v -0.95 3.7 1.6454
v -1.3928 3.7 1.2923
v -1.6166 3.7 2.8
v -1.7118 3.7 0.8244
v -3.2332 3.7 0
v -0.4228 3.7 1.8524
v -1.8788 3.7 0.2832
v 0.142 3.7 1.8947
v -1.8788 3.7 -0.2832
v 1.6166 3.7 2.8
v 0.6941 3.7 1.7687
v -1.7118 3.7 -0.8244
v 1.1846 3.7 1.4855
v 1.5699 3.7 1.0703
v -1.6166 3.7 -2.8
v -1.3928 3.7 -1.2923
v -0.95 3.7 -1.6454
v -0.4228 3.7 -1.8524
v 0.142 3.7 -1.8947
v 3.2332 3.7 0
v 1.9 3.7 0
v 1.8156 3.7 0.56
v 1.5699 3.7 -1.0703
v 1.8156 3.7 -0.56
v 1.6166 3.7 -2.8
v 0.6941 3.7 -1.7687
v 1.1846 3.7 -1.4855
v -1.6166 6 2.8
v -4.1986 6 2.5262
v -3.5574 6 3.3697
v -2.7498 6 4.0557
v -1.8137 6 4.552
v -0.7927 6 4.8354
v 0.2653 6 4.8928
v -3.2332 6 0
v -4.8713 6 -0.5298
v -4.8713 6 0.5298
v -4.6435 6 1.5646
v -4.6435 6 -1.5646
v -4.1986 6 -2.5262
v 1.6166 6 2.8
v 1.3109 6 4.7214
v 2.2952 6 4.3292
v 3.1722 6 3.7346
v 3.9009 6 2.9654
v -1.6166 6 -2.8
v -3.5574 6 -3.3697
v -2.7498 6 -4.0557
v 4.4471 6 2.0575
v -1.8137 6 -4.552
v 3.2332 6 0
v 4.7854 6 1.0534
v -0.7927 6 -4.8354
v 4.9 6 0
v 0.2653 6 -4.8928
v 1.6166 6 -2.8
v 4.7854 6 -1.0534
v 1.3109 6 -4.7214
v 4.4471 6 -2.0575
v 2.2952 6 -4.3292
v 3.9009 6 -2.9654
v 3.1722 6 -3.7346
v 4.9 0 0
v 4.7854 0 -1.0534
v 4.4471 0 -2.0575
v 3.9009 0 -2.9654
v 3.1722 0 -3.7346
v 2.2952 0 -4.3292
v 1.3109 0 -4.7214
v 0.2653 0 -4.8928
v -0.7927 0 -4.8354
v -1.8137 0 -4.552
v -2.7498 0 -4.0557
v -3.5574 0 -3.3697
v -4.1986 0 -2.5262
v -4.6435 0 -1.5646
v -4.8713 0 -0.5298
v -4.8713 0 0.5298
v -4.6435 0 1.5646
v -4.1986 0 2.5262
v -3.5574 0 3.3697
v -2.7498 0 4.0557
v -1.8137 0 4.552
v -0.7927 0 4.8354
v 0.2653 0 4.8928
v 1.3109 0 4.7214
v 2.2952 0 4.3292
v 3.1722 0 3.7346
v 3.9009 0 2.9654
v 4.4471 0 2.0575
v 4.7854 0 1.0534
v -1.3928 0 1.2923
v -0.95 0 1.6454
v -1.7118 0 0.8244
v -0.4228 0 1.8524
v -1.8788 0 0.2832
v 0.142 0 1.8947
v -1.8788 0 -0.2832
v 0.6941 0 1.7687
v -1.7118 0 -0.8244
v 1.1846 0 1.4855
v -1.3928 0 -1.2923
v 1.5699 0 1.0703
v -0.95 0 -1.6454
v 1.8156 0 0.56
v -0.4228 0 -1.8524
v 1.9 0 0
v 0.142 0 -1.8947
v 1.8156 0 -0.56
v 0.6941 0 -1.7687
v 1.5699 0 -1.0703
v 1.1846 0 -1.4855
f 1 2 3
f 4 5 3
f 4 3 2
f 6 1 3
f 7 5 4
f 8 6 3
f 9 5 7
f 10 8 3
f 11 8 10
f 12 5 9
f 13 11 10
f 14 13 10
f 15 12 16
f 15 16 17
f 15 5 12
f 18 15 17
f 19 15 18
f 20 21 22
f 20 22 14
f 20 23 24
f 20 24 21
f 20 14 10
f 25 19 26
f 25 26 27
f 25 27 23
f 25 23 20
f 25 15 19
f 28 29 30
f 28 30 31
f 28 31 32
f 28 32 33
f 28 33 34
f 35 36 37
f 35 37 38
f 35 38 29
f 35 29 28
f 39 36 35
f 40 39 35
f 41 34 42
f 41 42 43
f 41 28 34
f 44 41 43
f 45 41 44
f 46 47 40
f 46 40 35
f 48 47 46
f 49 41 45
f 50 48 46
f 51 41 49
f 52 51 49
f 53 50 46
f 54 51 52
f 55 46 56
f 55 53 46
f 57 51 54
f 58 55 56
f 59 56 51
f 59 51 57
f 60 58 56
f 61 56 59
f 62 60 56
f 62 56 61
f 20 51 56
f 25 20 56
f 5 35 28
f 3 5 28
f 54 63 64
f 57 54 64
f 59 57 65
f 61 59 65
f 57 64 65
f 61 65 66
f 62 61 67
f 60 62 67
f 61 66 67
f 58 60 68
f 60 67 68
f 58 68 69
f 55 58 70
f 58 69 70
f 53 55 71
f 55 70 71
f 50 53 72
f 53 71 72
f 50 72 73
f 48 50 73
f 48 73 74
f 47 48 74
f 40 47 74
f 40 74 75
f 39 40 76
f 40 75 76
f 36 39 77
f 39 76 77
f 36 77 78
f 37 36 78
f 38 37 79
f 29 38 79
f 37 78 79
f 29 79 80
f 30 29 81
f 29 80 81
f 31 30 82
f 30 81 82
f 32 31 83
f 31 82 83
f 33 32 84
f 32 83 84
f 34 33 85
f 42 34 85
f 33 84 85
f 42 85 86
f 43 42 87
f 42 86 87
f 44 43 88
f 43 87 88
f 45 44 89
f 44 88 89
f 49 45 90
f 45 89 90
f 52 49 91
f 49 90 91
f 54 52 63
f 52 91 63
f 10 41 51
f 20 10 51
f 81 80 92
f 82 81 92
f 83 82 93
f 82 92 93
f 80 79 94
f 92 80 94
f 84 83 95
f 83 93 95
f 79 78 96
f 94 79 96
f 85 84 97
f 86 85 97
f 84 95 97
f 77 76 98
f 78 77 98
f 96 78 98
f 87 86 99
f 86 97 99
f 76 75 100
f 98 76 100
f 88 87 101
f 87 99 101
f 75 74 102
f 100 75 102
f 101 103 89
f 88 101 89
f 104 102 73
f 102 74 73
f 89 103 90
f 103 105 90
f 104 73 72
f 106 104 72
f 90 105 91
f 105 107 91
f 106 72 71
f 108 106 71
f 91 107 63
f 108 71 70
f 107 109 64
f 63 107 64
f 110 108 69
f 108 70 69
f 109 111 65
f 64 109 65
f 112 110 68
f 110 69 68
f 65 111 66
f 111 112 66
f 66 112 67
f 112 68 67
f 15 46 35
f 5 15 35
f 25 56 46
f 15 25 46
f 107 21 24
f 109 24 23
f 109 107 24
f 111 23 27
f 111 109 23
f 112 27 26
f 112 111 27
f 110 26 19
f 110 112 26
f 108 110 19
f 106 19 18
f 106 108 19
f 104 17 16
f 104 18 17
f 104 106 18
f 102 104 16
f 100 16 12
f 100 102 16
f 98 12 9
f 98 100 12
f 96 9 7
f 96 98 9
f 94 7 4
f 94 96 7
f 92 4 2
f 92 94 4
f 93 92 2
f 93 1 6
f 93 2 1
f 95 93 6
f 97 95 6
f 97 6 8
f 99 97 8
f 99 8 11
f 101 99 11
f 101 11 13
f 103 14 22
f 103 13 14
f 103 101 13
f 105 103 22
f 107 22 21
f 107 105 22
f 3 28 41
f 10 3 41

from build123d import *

# Parameters (mm, degrees)
SKETCH1_R           = 4.9
SKETCH1_R_2         = 1.9
EXTRUDE_THIN1_DEPTH = 6
CUT_EXTRUDE1_DEPTH  = 2.3


with BuildPart() as part:
    # Sketch1 → Extrude-Thin1 (new body)
    with BuildSketch(Plane(origin=(0, 0, 0), x_dir=(1, 0, 0), z_dir=(0, 1, 0))):
        Circle(SKETCH1_R)
        Circle(SKETCH1_R_2, mode=Mode.SUBTRACT)
    extrude(amount=EXTRUDE_THIN1_DEPTH)

    # Sketch2 → Cut-Extrude1 (cut)
    with BuildSketch(Plane(origin=(0, 6, 0), x_dir=(1, 0, 0), z_dir=(0, 1, 0))):
        Polygon((3.233161507, 0), (1.616580754, 2.8), (-1.616580754, 2.8), (-3.233161507, 0), (-1.616580754, -2.8), (1.616580754, -2.8), align=None)
    extrude(amount=-CUT_EXTRUDE1_DEPTH, mode=Mode.SUBTRACT)


solid = part.part
